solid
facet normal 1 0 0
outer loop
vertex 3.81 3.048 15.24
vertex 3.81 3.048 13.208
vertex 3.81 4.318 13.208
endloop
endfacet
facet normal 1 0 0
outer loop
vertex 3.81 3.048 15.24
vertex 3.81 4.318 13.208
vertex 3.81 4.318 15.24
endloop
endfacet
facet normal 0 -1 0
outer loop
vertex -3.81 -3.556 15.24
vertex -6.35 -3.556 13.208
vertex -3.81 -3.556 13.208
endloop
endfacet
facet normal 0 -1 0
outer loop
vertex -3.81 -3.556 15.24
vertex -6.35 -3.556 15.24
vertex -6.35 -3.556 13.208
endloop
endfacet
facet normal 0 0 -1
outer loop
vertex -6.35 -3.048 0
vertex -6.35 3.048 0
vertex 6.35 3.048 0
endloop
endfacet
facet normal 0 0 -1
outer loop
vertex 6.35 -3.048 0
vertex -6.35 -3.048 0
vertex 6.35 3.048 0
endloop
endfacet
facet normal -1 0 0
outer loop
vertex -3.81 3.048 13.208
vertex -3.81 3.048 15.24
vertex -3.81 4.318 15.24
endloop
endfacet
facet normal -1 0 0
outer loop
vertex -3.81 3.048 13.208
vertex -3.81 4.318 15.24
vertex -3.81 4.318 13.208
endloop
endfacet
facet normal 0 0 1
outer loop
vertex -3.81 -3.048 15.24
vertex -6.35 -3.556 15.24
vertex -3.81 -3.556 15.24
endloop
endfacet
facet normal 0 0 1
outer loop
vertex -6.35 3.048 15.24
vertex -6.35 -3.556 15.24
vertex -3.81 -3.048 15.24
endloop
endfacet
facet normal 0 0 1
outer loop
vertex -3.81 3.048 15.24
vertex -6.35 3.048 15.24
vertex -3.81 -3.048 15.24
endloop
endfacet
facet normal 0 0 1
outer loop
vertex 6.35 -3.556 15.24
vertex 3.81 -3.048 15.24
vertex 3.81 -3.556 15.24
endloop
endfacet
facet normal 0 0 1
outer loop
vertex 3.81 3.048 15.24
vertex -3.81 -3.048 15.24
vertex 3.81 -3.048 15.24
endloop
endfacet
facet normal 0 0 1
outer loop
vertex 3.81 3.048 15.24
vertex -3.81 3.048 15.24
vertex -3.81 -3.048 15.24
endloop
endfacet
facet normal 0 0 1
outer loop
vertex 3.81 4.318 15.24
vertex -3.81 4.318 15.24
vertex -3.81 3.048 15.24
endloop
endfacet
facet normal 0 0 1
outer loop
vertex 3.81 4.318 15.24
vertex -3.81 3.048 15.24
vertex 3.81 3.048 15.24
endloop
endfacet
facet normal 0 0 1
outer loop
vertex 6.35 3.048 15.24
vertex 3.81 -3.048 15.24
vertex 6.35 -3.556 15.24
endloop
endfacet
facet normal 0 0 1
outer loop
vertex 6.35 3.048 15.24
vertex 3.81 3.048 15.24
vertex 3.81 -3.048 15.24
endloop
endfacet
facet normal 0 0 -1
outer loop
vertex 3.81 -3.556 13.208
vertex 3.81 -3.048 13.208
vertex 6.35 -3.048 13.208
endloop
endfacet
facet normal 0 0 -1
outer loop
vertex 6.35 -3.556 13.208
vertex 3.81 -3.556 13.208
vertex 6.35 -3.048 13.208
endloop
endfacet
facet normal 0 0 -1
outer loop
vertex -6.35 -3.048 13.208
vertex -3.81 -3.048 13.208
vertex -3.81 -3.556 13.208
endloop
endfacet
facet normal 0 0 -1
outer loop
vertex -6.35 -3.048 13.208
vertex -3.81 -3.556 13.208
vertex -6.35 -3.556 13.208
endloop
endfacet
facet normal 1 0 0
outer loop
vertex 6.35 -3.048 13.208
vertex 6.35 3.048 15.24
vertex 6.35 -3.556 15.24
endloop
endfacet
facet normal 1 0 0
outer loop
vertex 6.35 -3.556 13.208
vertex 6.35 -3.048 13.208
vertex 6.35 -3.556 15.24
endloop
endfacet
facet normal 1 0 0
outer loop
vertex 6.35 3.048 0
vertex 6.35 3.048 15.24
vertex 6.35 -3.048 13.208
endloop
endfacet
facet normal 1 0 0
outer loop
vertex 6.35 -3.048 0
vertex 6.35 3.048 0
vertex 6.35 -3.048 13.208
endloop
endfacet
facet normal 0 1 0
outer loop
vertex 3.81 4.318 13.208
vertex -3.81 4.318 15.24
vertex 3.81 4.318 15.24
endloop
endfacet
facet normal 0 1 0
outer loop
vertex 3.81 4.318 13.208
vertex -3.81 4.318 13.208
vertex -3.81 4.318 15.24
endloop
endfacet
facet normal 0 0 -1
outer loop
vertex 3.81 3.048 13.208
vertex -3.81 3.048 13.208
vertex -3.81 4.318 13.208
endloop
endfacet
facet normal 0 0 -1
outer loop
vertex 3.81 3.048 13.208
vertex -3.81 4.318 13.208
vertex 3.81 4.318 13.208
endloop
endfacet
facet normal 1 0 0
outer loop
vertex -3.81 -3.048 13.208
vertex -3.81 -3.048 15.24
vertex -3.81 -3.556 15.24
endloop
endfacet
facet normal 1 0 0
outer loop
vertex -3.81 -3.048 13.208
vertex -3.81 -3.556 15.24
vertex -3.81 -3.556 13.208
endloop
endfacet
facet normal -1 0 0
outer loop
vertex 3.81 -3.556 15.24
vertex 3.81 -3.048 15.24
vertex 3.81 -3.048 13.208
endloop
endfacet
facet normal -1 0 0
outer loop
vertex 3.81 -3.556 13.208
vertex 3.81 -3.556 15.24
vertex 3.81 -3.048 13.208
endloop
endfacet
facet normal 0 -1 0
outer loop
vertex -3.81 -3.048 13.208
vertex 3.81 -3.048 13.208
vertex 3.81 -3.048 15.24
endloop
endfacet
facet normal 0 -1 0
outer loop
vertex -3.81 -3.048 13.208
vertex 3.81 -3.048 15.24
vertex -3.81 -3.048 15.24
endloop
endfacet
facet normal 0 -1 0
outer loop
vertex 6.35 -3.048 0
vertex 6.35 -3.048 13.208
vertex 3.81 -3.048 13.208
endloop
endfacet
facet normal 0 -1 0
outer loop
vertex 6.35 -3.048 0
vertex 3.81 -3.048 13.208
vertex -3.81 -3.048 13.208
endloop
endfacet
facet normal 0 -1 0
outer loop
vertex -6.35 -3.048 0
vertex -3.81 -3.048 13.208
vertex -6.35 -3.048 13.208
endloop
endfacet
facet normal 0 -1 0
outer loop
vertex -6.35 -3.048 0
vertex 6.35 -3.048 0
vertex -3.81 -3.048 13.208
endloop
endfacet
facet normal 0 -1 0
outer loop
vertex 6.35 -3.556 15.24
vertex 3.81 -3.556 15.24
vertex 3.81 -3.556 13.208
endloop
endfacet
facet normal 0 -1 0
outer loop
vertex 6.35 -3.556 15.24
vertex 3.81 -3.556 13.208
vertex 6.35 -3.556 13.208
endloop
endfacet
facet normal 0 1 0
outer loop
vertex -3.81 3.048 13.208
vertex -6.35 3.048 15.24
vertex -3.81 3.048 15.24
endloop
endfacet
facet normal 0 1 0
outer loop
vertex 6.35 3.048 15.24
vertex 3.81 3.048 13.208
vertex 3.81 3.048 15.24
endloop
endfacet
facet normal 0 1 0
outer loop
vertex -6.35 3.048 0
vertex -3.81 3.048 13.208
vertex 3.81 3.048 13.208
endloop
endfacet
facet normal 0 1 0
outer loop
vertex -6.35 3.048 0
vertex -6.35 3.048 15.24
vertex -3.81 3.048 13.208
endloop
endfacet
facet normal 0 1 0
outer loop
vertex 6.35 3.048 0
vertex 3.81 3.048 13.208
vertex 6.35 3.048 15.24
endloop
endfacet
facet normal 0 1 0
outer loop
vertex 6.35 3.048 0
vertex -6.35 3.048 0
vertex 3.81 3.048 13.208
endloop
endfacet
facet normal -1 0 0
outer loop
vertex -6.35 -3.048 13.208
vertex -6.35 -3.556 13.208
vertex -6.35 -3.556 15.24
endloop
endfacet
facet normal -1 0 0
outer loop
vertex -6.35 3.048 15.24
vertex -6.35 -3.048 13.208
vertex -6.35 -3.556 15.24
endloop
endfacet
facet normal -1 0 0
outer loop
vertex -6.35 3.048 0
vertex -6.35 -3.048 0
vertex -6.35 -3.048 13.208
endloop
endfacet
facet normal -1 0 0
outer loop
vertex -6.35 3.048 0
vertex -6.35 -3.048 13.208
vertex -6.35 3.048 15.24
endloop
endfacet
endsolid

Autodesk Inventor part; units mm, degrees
ref_plane "YZ Plane" through (0, 0, 0) normal (1, 0, 0) x (0, 1, 0)
ref_plane "XZ Plane" through (0, 0, 0) normal (0, 1, 0) x (-1, 0, 0)
ref_plane "XY Plane" through (0, 0, 0) normal (0, 0, 1) x (1, 0, 0)
sketch "Sketch1" plane through (0, 0, 0) normal (0, 0, 1) x (1, 0, 0)
  line L0 (-6.35, 3.048) -> (6.35, 3.048)
  line L1 (6.35, 3.048) -> (6.35, -3.048)
  line L2 (6.35, -3.048) -> (-6.35, -3.048)
  line L3 (-6.35, -3.048) -> (-6.35, 3.048)
  point P0 (0, 0)
  point P1 (0, -3.048)
  point P2 (-6.35, 0)
  dimension "d0" = 12.7
  dimension "d1" = 6.096
extrude "Extrusion1" add sketch "Sketch1" along normal blind 15.24
sketch "Sketch2" plane through (-6.35, 3.048, 0) normal (0, 1, 0) x (1, 0, 0)
  line L0 (0, -15.24) -> (12.7, -15.24) projected
  line L1 (2.54, -13.208) -> (10.16, -13.208)
  line L2 (10.16, -13.208) -> (10.16, -15.24)
  line L3 (10.16, -15.24) -> (2.54, -15.24)
  line L4 (2.54, -15.24) -> (2.54, -13.208)
  point P0 (6.35, -15.24)
  dimension "d4" = 7.62
  dimension "d5" = 2.032
extrude "Extrusion2" add sketch "Sketch2" along normal blind 1.27
sketch "Sketch3" plane through (-6.35, -3.048, 0) normal (0, -1, 0) x (1, 0, 0)
  line L0 (0, 15.24) -> (2.54, 15.24)
  line L1 (2.54, 15.24) -> (2.54, 13.208)
  line L2 (2.54, 13.208) -> (0, 13.208)
  line L3 (0, 13.208) -> (0, 15.24)
  line L4 (12.7, 15.24) -> (10.16, 15.24)
  line L5 (10.16, 15.24) -> (10.16, 13.208)
  line L6 (10.16, 13.208) -> (12.7, 13.208)
  line L7 (12.7, 13.208) -> (12.7, 15.24)
  dimension "d8" = 2.54
  dimension "d9" = 2.54
  dimension "d10" = 2.032
  dimension "d11" = 2.032
extrude "Extrusion3" add sketch "Sketch3" along normal blind 0.508
sketch "Sketch4" plane through (0, 0, 0) normal (0, 0, -1) x (-1, 0, 0)
  line L0 (6.35, 3.048) -> (-6.35, 3.048) projected
  line L1 (-6.35, 3.048) -> (-6.35, -3.048) projected
  line L2 (-6.35, -3.048) -> (6.35, -3.048) projected
  line L3 (6.35, -3.048) -> (6.35, 3.048) projected
  point P0 (-5.08, 1.27)
  point P1 (-2.54, 1.27)
  point P2 (2.54, 1.27)
  point P3 (5.08, 1.27)
  point P4 (-5.08, -1.27)
  point P5 (-2.54, -1.27)
  point P6 (2.54, -1.27)
  point P7 (5.08, -1.27)
  point P8 (0, 3.048)
  point P9 (0, 1.27)
  point P10 (0, -1.27)
  point P11 (0, 1.27)
  point P12 (0, -1.27)
  dimension "d14" = 1.27
  dimension "d15" = 1.778
  dimension "d16" = 1.27
  dimension "d17" = 1.778
  dimension "d18" = 2.54
  dimension "d19" = 2.54
  dimension "d20" = 2.54
  dimension "d21" = 2.54
properties part number "10 Pin DR"
